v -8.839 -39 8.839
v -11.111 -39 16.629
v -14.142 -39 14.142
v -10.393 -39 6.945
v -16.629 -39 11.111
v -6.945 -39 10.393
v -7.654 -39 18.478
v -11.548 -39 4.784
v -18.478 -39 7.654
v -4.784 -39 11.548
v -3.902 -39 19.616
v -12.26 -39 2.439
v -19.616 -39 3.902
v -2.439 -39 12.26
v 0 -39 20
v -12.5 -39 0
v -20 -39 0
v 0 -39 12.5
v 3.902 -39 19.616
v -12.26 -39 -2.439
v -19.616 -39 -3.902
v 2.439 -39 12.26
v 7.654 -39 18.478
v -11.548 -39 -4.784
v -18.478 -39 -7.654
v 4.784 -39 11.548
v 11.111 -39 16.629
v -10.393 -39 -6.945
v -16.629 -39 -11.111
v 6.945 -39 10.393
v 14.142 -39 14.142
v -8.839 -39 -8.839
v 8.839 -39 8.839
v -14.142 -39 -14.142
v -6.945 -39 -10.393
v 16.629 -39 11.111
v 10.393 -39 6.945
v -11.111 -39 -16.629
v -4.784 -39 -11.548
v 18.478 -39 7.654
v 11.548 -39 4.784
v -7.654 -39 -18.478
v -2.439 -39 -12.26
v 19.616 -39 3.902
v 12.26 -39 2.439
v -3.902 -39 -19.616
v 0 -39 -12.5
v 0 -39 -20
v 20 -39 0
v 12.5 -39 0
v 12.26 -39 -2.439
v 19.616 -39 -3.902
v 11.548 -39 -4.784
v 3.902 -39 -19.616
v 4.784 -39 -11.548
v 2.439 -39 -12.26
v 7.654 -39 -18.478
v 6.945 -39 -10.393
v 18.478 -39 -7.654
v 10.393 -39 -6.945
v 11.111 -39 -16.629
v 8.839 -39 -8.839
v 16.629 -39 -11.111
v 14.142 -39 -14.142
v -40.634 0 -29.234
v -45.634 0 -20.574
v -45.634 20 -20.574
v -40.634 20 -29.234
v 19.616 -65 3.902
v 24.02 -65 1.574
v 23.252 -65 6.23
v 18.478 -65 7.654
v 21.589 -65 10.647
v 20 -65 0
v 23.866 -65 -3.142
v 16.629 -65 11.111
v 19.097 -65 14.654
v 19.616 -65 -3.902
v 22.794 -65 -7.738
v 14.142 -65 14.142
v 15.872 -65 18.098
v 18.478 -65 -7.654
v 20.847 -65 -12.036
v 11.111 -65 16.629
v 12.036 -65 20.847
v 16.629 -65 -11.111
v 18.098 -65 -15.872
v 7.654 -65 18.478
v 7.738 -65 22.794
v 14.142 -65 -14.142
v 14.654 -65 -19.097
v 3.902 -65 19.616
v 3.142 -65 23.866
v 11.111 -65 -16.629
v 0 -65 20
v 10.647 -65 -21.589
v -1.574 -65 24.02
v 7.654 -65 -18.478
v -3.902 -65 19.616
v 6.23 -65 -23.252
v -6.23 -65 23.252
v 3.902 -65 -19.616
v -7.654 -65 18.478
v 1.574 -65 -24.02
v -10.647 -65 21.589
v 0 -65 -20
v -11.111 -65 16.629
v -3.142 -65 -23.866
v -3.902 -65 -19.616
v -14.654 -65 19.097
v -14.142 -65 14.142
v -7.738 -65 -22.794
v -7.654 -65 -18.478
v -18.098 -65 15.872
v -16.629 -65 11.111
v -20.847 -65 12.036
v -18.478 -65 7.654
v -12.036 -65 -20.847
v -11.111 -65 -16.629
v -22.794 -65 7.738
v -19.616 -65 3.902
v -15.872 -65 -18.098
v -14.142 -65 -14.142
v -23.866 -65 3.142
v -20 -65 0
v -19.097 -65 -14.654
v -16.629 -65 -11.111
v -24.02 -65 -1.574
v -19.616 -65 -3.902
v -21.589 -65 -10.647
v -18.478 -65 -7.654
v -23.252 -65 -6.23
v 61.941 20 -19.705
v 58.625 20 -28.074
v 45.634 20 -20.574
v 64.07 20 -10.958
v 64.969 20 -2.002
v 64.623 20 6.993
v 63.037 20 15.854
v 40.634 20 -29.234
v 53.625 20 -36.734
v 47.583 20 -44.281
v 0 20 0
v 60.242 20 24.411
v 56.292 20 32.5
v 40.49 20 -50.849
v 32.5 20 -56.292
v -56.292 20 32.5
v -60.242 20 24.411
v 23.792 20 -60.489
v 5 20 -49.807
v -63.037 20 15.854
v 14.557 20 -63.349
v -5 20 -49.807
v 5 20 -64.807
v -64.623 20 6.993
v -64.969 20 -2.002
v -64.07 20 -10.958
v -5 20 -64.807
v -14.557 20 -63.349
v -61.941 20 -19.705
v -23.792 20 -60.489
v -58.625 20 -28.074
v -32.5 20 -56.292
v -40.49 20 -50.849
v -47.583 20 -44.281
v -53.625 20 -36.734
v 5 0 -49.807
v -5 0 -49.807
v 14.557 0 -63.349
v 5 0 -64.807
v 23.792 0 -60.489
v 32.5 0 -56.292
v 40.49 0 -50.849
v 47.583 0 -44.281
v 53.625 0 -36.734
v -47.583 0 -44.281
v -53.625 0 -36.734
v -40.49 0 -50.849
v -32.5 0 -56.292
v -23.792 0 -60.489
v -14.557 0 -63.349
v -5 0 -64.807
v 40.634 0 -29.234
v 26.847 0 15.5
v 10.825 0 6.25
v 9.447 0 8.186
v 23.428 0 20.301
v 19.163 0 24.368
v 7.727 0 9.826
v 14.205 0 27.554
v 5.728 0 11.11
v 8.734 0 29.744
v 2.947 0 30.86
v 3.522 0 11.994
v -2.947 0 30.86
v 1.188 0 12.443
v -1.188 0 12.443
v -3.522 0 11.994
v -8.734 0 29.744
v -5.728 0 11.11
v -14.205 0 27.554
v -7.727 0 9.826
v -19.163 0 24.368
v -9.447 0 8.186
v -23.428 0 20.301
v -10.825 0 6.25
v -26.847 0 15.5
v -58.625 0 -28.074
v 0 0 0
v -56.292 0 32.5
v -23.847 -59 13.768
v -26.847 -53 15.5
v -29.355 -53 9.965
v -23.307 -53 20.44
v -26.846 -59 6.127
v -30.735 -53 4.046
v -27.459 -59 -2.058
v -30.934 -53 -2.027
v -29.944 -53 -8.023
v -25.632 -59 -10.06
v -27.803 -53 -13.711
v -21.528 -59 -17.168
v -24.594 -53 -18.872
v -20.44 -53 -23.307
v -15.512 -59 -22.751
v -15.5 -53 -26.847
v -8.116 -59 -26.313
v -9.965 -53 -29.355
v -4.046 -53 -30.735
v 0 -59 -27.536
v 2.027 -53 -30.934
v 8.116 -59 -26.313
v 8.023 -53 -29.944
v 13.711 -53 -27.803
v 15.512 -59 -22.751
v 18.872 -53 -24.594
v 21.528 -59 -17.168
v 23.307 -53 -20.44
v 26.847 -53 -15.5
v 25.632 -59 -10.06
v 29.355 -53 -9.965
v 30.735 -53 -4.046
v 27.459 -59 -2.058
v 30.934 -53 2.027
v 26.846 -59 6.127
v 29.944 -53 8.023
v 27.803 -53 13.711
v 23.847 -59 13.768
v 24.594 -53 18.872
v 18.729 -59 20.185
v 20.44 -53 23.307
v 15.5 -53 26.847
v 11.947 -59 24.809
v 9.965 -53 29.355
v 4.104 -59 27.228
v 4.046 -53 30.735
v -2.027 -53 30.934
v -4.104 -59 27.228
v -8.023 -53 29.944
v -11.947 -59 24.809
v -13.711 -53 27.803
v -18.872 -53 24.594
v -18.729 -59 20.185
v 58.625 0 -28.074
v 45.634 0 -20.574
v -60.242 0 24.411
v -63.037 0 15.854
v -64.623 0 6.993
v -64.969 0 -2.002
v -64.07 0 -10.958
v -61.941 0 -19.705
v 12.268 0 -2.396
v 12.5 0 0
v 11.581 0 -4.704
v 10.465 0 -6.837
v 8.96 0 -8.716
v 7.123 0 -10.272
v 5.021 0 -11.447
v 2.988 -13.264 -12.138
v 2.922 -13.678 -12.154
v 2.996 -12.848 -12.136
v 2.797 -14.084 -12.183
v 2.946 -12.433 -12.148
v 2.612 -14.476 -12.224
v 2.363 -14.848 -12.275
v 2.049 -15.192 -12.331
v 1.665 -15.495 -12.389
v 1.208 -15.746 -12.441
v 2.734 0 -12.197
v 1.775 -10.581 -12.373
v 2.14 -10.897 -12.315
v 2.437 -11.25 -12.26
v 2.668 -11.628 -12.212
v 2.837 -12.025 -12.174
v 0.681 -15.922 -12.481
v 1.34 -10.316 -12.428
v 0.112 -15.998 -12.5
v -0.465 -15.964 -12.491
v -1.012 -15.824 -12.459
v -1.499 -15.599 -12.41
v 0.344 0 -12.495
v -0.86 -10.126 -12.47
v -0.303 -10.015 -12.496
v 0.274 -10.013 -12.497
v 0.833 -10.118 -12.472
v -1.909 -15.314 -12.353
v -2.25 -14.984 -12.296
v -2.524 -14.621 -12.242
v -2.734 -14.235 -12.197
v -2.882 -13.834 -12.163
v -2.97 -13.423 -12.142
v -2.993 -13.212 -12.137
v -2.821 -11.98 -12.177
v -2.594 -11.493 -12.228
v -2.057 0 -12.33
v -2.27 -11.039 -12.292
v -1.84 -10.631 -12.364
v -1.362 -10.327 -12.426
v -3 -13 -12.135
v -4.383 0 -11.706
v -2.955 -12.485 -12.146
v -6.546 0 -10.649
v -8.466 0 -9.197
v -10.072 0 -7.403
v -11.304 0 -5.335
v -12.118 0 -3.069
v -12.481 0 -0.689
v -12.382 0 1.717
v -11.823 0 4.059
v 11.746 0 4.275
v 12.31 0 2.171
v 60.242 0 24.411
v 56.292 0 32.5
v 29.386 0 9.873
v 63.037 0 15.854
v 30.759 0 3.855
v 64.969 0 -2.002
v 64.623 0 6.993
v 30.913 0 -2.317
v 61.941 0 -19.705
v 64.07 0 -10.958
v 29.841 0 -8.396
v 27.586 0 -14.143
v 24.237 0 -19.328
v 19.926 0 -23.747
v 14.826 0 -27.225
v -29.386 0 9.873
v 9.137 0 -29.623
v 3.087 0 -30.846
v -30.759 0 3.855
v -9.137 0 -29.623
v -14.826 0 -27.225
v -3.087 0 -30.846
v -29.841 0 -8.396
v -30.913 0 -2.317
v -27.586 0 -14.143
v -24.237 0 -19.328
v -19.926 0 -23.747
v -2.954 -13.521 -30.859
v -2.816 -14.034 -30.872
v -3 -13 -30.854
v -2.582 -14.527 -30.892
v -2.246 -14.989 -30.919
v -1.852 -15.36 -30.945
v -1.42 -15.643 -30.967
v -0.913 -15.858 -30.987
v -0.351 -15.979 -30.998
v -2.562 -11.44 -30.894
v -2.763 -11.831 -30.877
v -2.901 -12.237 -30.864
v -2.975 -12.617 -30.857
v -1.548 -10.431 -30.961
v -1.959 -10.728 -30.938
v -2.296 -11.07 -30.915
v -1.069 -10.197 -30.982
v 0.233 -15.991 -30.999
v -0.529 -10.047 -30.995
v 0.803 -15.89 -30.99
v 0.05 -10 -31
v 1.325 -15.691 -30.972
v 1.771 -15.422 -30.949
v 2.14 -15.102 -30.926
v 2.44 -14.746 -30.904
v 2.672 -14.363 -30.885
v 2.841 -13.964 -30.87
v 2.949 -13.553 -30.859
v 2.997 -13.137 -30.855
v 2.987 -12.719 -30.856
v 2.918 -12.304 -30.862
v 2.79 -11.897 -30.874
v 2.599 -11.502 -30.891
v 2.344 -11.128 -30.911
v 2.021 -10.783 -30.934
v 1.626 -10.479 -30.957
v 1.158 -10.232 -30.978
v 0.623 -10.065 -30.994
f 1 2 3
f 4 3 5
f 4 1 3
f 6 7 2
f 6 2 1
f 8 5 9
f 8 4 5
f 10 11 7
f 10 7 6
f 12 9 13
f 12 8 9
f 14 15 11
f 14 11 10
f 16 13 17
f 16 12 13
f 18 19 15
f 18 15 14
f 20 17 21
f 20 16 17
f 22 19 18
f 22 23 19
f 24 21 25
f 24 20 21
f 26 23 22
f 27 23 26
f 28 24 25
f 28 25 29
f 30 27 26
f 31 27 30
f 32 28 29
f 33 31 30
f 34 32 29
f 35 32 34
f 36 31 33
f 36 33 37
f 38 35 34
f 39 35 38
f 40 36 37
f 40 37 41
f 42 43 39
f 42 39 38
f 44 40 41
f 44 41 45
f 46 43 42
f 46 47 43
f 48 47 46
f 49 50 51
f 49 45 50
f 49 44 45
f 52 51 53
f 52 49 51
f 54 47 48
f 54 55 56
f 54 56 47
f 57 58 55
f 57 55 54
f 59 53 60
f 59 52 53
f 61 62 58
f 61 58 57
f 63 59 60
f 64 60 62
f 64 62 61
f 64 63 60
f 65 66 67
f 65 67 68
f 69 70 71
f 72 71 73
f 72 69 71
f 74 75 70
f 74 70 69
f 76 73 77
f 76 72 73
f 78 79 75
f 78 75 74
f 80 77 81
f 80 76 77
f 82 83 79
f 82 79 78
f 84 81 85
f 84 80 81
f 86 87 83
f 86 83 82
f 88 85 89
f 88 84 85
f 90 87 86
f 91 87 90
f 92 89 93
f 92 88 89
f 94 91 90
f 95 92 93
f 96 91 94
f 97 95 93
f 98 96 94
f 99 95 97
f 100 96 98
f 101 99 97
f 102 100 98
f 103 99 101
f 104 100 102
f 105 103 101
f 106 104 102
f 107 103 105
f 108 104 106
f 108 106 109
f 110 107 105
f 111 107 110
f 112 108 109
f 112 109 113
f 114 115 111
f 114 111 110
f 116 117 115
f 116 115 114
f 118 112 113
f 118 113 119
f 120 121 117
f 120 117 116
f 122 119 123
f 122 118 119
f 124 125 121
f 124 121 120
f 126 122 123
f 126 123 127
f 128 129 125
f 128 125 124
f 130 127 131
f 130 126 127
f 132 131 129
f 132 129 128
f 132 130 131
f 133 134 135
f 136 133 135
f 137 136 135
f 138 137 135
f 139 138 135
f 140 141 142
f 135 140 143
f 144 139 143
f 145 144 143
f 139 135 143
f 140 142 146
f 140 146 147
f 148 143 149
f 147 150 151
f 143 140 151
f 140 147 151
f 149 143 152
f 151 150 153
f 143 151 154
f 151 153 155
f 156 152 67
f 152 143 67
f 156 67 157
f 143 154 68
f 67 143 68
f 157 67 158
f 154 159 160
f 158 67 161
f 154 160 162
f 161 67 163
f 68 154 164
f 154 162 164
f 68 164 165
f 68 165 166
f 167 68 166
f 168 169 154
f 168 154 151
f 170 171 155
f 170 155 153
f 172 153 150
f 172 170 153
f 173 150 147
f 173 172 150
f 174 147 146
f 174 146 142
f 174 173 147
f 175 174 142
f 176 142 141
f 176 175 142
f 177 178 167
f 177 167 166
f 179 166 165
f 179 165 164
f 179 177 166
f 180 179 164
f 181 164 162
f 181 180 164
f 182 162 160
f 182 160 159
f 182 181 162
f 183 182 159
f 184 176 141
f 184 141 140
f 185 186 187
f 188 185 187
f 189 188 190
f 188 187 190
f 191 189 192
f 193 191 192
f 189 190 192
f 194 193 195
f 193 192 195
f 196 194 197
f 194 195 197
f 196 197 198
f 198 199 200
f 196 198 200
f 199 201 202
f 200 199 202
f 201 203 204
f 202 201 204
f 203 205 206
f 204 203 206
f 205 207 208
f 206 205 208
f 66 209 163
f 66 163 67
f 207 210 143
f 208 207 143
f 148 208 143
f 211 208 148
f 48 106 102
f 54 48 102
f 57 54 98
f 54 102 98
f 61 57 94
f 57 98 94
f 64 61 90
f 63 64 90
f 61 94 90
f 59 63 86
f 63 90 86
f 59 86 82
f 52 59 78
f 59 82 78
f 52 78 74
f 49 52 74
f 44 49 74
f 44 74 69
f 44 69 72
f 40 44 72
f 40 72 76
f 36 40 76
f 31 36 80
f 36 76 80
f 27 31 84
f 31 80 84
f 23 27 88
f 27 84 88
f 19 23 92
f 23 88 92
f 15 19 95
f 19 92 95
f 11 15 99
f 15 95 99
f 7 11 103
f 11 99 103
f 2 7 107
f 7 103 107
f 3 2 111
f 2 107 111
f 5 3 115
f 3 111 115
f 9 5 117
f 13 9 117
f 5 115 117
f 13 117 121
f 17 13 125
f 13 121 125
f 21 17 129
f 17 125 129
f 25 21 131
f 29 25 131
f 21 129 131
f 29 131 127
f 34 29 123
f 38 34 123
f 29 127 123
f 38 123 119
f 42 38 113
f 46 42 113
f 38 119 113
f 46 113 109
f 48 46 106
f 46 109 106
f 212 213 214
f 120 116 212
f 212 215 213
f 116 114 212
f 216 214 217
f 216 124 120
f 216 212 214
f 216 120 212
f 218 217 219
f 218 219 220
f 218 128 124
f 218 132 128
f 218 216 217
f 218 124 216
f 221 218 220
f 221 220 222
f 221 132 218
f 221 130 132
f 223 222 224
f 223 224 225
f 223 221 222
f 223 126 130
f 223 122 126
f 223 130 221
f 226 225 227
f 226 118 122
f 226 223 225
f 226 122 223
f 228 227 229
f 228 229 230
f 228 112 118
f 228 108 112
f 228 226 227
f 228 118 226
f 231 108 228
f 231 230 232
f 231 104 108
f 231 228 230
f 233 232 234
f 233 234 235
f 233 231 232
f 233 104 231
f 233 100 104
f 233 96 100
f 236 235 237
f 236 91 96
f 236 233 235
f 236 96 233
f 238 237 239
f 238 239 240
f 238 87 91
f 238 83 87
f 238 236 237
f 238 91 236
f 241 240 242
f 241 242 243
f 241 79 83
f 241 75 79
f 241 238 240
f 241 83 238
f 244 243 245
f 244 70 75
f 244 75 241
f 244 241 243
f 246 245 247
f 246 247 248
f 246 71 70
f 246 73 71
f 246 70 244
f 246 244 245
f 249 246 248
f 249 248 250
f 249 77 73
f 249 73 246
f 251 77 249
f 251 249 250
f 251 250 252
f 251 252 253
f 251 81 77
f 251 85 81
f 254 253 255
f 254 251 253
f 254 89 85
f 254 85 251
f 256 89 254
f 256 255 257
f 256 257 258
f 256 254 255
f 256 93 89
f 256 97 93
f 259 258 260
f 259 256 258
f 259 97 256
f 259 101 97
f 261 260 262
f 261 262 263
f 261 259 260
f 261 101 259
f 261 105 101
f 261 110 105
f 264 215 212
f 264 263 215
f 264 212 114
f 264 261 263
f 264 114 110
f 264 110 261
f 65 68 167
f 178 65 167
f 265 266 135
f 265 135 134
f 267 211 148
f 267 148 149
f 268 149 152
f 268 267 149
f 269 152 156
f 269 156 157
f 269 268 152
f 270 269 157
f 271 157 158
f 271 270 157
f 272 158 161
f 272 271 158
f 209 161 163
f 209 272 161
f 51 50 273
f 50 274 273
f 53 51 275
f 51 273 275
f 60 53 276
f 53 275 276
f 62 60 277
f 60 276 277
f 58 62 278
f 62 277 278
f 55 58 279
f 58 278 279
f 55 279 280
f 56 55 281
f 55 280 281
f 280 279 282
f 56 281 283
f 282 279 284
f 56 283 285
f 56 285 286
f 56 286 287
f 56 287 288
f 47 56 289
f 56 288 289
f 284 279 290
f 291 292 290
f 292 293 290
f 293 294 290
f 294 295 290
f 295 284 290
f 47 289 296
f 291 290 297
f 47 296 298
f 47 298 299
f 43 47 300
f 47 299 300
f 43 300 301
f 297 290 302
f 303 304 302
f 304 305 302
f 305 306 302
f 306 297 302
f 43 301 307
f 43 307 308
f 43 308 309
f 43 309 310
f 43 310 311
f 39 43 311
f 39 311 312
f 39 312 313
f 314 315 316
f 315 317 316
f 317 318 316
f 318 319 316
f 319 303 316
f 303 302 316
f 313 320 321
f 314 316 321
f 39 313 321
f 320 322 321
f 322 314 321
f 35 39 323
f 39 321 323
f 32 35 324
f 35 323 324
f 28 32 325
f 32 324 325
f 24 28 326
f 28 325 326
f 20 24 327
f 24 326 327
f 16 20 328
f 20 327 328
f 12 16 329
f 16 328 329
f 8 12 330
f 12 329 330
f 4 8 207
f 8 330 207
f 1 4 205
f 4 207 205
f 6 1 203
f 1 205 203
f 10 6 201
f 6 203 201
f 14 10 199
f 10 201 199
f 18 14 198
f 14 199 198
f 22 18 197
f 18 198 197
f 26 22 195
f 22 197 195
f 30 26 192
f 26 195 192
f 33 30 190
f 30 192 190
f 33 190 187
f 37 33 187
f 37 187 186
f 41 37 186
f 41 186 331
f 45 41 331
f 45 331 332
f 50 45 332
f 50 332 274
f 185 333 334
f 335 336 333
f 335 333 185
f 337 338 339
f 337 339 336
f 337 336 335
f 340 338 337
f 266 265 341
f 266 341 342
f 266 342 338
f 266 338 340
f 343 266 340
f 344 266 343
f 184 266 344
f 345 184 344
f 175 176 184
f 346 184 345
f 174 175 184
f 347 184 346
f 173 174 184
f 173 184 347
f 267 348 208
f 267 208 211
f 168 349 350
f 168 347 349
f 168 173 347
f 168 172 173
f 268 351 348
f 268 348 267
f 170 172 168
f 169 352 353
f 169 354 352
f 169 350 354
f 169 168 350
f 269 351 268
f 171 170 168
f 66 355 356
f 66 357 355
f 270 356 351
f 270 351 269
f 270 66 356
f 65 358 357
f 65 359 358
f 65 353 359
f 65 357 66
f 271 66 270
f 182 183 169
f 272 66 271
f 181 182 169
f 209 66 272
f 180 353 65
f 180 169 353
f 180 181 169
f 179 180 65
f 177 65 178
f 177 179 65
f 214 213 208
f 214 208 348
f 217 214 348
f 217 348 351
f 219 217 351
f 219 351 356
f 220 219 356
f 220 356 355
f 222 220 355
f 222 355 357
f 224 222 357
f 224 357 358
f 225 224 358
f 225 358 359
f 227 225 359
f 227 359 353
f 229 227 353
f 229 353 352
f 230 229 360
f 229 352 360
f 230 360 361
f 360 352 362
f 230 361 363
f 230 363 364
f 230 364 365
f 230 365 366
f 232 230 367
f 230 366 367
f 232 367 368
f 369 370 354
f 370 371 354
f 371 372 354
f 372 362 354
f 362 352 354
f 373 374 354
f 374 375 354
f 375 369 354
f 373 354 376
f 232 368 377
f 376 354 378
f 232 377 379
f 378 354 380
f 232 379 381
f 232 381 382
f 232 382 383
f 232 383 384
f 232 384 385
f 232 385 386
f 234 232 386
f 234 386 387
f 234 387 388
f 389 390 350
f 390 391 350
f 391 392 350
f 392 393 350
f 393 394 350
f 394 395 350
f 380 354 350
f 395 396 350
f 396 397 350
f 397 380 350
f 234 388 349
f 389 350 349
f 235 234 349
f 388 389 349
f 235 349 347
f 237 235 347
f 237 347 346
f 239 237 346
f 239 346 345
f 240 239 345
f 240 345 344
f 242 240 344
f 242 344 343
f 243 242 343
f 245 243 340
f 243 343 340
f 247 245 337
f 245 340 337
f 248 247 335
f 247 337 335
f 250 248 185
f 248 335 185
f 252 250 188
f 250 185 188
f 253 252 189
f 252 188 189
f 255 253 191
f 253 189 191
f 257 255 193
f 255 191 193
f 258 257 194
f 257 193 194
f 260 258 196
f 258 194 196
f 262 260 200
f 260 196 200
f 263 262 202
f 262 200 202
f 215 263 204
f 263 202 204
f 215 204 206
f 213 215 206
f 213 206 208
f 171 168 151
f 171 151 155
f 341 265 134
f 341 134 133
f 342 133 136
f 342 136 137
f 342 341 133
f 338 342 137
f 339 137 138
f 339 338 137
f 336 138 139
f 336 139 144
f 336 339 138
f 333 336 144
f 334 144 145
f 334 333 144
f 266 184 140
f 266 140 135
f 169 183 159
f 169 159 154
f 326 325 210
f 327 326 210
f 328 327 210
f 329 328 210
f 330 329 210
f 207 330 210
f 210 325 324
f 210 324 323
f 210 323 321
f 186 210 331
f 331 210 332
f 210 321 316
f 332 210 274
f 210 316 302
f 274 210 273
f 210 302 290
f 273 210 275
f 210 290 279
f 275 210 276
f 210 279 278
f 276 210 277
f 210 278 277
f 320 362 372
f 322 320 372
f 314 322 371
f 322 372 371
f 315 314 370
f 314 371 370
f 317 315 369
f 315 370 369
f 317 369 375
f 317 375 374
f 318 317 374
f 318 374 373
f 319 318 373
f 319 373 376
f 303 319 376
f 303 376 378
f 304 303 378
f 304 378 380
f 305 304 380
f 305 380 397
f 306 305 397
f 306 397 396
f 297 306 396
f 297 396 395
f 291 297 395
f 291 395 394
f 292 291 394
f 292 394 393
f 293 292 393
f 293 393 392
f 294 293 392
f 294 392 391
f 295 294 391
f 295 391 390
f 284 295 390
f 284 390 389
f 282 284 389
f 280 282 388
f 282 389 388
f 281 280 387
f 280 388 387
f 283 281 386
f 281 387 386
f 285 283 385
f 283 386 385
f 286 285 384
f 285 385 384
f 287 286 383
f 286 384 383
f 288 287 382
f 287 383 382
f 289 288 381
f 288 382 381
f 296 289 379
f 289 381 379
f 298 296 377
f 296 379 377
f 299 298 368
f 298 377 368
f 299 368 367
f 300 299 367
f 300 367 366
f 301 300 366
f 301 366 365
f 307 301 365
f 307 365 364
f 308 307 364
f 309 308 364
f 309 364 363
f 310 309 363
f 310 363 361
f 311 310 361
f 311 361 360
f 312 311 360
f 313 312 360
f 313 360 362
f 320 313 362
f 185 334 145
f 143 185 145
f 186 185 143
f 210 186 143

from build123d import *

# Parameters (mm, degrees)
ESTRUSIONE_ESTRUSIONE1_DEPTH = 20
SCHIZZO2_R                   = 31
ESTRUSIONE_ESTRUSIONE2_DEPTH = 65
SCHIZZO3_R                   = 20
TAGLIO_ESTRUSIONE1_DEPTH     = 26
FORO_25_0_25_1_D             = 25
FORO_25_0_25_1_DEPTH         = 39
FORO_6_0_6_1_REACH           = 113.724
FORO_6_0_6_1_BORE_R          = 3
SMUSSO1_SIZE                 = 12
SMUSSO1_SIZE2                = 6.92820323


with BuildPart() as part:
    # Schizzo1 → Estrusione-Estrusione1 (new body)
    with BuildSketch(Plane(origin=(0, 0, 0), x_dir=(1, 0, 0), z_dir=(0, 1, 0))):
        with BuildLine():
            Line((0, 0), (-56.291651246, -32.5))
            ThreePointArc((-56.291651246, -32.5), (-64.9518339, -2.501853916), (-58.624860802, 28.073576473))
            Line((-58.624860802, 28.073576473), (-45.634479745, 20.573576473))
            Line((-45.634479745, 20.573576473), (-40.634479745, 29.233830511))
            Line((-40.634479745, 29.233830511), (-53.624860802, 36.733830511))
            ThreePointArc((-53.624860802, 36.733830511), (-32.5, 56.291651246), (-5, 64.807406984))
            Line((-5, 64.807406984), (-5, 49.807406984))
            Line((-5, 49.807406984), (5, 49.807406984))
            Line((5, 49.807406984), (5, 64.807406984))
            ThreePointArc((5, 64.807406984), (32.5, 56.291651246), (53.624860802, 36.733830511))
            Line((53.624860802, 36.733830511), (40.634479745, 29.233830511))
            Line((40.634479745, 29.233830511), (45.634479745, 20.573576473))
            Line((45.634479745, 20.573576473), (58.624860802, 28.073576473))
            ThreePointArc((58.624860802, 28.073576473), (64.9518339, -2.501853916), (56.291651246, -32.5))
            Line((56.291651246, -32.5), (0, 0))
        make_face()
    extrude(amount=ESTRUSIONE_ESTRUSIONE1_DEPTH)

    # Schizzo2 → Estrusione-Estrusione2 (add)
    with BuildSketch(Plane.XZ):
        with Locations(Location((0, 0, 0), (0, 0, 150))):
            Circle(SCHIZZO2_R)
    extrude(amount=ESTRUSIONE_ESTRUSIONE2_DEPTH)

    # Schizzo3 → Taglio-Estrusione1 (cut)
    with BuildSketch(Plane.XZ.offset(65)):
        with Locations(Location((0, 0, 0), (0, 0, 270))):
            Circle(SCHIZZO3_R)
    extrude(amount=-TAGLIO_ESTRUSIONE1_DEPTH, mode=Mode.SUBTRACT)

    # Foro Ø25.0 (25)-1
    with Locations(Plane(origin=(0, -39, 0), x_dir=(-1, 0, 0), z_dir=(0, -1, 0))):
        with Locations((0, 0)):
            Hole(FORO_25_0_25_1_D / 2, depth=FORO_25_0_25_1_DEPTH)

    # Foro Ø6.0 (6)-1 bore → Foro Ø6.0 (6)-1 (cut, up to next)
    with BuildSketch(Plane(origin=(0, 0, -31), x_dir=(-1, 0, 0), z_dir=(0, 0, -1)), mode=Mode.PRIVATE) as foro_6_0_6_1_sk1:
        with Locations((0, -13)):
            Circle(FORO_6_0_6_1_BORE_R)
    foro_6_0_6_1_tool1 = extrude(foro_6_0_6_1_sk1.sketch, amount=-FORO_6_0_6_1_REACH, mode=Mode.PRIVATE) & part.part
    add(foro_6_0_6_1_tool1.solids().sort_by_distance((0, -13, -31))[0], mode=Mode.SUBTRACT)

    # Smusso1
    smusso1_edges = [part.edges().sort_by_distance(p)[0] for p in [
        (26.846787517, -65, -15.5),
    ]]
    smusso1_side = [part.faces().sort_by_distance(p)[0] for p in [
        (26.846787517, -32.5, -15.5),
    ]]
    chamfer(smusso1_edges, length=SMUSSO1_SIZE, length2=SMUSSO1_SIZE2, reference=smusso1_side[0])


solid = part.part
